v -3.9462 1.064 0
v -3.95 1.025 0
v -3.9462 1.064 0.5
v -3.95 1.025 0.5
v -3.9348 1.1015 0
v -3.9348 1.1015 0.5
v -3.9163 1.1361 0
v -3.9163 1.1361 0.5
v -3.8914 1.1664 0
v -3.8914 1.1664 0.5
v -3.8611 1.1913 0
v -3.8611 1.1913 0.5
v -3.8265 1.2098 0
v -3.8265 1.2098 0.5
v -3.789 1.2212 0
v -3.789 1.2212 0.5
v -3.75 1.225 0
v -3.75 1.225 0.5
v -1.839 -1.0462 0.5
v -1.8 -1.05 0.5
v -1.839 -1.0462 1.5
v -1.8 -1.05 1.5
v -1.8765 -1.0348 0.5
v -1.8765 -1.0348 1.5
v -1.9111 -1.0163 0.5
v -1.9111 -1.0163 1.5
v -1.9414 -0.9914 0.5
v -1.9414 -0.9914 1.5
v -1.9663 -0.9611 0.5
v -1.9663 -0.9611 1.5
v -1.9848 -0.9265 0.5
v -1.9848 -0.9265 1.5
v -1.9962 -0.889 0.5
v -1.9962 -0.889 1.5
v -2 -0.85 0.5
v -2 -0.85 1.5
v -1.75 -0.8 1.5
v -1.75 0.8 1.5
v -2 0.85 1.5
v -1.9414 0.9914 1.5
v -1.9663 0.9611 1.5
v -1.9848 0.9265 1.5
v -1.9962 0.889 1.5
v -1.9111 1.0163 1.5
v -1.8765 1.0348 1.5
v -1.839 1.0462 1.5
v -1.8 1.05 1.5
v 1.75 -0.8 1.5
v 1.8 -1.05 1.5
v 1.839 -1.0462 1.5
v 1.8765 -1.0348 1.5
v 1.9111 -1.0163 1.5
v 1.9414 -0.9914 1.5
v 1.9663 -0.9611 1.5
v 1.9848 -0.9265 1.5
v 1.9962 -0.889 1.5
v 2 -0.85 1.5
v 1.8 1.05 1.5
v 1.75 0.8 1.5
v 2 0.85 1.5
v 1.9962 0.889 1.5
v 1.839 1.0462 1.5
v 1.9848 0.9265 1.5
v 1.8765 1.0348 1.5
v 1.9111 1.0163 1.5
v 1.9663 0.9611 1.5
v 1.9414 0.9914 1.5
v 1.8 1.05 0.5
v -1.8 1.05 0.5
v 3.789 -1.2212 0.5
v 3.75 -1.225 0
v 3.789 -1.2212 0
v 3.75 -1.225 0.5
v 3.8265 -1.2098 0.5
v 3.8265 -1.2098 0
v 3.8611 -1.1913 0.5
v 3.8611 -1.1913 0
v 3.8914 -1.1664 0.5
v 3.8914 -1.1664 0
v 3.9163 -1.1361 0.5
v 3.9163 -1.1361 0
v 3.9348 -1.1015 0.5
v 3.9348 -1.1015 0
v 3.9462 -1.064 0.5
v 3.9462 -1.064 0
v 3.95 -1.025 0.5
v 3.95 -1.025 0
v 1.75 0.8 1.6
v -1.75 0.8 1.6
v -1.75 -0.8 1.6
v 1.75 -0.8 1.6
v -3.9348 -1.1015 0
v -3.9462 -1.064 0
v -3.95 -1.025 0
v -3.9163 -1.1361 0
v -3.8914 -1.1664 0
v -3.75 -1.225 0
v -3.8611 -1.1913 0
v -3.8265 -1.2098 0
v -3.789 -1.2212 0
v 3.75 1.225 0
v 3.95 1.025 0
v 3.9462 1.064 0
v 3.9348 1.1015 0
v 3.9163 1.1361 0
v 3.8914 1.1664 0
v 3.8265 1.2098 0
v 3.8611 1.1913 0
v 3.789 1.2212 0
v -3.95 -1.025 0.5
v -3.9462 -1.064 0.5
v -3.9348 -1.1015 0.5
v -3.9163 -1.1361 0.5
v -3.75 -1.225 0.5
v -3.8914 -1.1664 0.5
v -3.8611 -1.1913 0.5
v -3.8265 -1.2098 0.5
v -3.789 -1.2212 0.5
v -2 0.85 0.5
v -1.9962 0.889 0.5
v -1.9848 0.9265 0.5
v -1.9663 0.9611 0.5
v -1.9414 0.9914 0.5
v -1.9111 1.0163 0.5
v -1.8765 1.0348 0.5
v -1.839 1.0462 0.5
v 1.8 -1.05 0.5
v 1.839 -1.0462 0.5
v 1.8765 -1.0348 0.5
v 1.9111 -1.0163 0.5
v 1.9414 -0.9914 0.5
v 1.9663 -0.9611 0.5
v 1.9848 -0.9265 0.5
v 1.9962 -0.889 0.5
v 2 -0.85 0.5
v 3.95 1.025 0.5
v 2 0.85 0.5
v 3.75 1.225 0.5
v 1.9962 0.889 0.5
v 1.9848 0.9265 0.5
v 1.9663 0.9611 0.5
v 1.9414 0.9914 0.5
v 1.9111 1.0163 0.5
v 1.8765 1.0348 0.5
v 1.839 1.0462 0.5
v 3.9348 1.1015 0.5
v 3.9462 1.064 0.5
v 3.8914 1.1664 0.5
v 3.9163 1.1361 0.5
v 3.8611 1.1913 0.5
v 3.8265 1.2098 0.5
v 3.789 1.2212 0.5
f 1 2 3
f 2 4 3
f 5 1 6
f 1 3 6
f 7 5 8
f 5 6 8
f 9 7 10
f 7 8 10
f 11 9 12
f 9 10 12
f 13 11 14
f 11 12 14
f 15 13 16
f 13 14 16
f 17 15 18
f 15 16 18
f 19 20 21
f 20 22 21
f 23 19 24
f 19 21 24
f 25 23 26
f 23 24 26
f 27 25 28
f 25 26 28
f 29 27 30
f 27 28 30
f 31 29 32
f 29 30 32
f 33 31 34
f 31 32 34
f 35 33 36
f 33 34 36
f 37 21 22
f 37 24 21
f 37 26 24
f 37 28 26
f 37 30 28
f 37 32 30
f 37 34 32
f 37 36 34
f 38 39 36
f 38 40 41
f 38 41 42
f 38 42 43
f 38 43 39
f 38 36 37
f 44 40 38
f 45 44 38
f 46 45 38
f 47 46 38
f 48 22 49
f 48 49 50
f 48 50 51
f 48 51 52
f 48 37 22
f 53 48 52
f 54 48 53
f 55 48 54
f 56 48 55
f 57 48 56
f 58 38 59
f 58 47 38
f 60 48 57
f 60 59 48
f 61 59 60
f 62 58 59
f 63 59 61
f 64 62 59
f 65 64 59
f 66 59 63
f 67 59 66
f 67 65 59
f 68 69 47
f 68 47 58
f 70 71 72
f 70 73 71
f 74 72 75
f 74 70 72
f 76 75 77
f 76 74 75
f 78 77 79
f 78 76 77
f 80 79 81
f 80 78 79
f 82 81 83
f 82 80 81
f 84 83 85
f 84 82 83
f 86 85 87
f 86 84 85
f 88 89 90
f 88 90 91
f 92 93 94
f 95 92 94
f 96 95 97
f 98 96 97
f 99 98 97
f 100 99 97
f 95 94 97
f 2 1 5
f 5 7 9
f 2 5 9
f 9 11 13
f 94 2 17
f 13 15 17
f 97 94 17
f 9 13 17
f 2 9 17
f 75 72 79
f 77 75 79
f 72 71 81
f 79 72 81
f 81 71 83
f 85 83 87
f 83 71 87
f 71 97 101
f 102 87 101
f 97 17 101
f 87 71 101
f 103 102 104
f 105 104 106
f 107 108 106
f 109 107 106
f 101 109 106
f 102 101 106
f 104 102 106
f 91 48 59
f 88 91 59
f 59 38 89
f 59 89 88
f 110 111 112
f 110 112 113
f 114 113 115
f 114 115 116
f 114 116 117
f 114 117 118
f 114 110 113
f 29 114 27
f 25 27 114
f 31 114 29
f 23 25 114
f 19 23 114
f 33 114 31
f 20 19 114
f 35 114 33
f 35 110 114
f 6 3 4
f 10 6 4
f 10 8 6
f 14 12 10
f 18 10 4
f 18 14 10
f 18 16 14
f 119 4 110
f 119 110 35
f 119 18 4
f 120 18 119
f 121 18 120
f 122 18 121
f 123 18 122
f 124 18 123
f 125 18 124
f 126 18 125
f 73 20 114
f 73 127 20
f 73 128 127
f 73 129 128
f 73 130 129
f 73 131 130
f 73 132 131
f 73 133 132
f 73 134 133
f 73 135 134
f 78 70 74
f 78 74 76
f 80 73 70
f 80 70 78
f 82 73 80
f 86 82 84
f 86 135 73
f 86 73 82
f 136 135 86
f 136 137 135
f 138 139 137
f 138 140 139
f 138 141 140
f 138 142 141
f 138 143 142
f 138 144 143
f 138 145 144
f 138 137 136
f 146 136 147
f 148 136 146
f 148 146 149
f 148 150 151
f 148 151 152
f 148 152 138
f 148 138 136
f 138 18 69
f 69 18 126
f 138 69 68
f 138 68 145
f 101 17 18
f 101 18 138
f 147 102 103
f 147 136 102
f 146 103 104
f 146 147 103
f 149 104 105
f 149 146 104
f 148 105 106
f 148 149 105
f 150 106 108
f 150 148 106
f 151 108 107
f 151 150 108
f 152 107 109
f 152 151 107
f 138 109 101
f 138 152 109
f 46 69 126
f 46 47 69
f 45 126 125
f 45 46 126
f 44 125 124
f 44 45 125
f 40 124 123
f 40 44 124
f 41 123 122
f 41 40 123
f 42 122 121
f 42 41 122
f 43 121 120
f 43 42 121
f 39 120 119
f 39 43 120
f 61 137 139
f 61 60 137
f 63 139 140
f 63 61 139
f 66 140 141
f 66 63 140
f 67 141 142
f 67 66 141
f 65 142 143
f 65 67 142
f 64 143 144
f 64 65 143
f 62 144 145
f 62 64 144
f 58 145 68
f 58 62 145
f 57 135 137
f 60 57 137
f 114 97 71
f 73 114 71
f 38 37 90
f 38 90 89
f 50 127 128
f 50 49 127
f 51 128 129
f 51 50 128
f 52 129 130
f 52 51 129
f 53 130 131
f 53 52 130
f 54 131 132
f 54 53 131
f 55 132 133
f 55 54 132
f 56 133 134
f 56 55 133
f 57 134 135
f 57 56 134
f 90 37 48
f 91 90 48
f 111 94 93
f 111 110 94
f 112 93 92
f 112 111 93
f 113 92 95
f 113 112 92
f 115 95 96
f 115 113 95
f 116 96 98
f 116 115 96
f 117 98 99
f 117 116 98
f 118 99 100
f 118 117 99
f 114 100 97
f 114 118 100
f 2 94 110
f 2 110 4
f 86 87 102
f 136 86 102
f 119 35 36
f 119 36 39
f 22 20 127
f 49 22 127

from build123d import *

# Parameters (mm, degrees)
F0_W     = 7.9
F0_H     = 2.45
F1_DEPTH = 0.5
F2_R     = 0.2
F3_W     = 4
F3_H     = 2.1
F4_DEPTH = 1
F5_R     = 0.2
F6_W     = 3.5
F6_H     = 1.6
F7_DEPTH = 0.1


with BuildPart() as f1:
    # F0 (on Top) → F1 (new body)
    with BuildSketch(Plane.XY):
        Rectangle(F0_W, F0_H)
    extrude(amount=F1_DEPTH)

    # F2
    f2_edges = [f1.edges().sort_by_distance(p)[0] for p in [
        (-3.95, -1.225, 0.25),
        (3.95, -1.225, 0.25),
        (3.95, 1.225, 0.25),
        (-3.95, 1.225, 0.25),
    ]]
    fillet(f2_edges, radius=F2_R)

    # F3 (on face) → F4 (join)
    with BuildSketch(Plane.XY.offset(0.5)):
        Rectangle(F3_W, F3_H)
    extrude(amount=F4_DEPTH)

    # F5
    f5_edges = [f1.edges().sort_by_distance(p)[0] for p in [
        (-2, -1.05, 1),
        (2, -1.05, 1),
        (2, 1.05, 1),
        (-2, 1.05, 1),
    ]]
    fillet(f5_edges, radius=F5_R)

    # F6 (on face) → F7 (join)
    with BuildSketch(Plane.XY.offset(1.5)):
        Rectangle(F6_W, F6_H)
    extrude(amount=F7_DEPTH)


solid = f1.part
